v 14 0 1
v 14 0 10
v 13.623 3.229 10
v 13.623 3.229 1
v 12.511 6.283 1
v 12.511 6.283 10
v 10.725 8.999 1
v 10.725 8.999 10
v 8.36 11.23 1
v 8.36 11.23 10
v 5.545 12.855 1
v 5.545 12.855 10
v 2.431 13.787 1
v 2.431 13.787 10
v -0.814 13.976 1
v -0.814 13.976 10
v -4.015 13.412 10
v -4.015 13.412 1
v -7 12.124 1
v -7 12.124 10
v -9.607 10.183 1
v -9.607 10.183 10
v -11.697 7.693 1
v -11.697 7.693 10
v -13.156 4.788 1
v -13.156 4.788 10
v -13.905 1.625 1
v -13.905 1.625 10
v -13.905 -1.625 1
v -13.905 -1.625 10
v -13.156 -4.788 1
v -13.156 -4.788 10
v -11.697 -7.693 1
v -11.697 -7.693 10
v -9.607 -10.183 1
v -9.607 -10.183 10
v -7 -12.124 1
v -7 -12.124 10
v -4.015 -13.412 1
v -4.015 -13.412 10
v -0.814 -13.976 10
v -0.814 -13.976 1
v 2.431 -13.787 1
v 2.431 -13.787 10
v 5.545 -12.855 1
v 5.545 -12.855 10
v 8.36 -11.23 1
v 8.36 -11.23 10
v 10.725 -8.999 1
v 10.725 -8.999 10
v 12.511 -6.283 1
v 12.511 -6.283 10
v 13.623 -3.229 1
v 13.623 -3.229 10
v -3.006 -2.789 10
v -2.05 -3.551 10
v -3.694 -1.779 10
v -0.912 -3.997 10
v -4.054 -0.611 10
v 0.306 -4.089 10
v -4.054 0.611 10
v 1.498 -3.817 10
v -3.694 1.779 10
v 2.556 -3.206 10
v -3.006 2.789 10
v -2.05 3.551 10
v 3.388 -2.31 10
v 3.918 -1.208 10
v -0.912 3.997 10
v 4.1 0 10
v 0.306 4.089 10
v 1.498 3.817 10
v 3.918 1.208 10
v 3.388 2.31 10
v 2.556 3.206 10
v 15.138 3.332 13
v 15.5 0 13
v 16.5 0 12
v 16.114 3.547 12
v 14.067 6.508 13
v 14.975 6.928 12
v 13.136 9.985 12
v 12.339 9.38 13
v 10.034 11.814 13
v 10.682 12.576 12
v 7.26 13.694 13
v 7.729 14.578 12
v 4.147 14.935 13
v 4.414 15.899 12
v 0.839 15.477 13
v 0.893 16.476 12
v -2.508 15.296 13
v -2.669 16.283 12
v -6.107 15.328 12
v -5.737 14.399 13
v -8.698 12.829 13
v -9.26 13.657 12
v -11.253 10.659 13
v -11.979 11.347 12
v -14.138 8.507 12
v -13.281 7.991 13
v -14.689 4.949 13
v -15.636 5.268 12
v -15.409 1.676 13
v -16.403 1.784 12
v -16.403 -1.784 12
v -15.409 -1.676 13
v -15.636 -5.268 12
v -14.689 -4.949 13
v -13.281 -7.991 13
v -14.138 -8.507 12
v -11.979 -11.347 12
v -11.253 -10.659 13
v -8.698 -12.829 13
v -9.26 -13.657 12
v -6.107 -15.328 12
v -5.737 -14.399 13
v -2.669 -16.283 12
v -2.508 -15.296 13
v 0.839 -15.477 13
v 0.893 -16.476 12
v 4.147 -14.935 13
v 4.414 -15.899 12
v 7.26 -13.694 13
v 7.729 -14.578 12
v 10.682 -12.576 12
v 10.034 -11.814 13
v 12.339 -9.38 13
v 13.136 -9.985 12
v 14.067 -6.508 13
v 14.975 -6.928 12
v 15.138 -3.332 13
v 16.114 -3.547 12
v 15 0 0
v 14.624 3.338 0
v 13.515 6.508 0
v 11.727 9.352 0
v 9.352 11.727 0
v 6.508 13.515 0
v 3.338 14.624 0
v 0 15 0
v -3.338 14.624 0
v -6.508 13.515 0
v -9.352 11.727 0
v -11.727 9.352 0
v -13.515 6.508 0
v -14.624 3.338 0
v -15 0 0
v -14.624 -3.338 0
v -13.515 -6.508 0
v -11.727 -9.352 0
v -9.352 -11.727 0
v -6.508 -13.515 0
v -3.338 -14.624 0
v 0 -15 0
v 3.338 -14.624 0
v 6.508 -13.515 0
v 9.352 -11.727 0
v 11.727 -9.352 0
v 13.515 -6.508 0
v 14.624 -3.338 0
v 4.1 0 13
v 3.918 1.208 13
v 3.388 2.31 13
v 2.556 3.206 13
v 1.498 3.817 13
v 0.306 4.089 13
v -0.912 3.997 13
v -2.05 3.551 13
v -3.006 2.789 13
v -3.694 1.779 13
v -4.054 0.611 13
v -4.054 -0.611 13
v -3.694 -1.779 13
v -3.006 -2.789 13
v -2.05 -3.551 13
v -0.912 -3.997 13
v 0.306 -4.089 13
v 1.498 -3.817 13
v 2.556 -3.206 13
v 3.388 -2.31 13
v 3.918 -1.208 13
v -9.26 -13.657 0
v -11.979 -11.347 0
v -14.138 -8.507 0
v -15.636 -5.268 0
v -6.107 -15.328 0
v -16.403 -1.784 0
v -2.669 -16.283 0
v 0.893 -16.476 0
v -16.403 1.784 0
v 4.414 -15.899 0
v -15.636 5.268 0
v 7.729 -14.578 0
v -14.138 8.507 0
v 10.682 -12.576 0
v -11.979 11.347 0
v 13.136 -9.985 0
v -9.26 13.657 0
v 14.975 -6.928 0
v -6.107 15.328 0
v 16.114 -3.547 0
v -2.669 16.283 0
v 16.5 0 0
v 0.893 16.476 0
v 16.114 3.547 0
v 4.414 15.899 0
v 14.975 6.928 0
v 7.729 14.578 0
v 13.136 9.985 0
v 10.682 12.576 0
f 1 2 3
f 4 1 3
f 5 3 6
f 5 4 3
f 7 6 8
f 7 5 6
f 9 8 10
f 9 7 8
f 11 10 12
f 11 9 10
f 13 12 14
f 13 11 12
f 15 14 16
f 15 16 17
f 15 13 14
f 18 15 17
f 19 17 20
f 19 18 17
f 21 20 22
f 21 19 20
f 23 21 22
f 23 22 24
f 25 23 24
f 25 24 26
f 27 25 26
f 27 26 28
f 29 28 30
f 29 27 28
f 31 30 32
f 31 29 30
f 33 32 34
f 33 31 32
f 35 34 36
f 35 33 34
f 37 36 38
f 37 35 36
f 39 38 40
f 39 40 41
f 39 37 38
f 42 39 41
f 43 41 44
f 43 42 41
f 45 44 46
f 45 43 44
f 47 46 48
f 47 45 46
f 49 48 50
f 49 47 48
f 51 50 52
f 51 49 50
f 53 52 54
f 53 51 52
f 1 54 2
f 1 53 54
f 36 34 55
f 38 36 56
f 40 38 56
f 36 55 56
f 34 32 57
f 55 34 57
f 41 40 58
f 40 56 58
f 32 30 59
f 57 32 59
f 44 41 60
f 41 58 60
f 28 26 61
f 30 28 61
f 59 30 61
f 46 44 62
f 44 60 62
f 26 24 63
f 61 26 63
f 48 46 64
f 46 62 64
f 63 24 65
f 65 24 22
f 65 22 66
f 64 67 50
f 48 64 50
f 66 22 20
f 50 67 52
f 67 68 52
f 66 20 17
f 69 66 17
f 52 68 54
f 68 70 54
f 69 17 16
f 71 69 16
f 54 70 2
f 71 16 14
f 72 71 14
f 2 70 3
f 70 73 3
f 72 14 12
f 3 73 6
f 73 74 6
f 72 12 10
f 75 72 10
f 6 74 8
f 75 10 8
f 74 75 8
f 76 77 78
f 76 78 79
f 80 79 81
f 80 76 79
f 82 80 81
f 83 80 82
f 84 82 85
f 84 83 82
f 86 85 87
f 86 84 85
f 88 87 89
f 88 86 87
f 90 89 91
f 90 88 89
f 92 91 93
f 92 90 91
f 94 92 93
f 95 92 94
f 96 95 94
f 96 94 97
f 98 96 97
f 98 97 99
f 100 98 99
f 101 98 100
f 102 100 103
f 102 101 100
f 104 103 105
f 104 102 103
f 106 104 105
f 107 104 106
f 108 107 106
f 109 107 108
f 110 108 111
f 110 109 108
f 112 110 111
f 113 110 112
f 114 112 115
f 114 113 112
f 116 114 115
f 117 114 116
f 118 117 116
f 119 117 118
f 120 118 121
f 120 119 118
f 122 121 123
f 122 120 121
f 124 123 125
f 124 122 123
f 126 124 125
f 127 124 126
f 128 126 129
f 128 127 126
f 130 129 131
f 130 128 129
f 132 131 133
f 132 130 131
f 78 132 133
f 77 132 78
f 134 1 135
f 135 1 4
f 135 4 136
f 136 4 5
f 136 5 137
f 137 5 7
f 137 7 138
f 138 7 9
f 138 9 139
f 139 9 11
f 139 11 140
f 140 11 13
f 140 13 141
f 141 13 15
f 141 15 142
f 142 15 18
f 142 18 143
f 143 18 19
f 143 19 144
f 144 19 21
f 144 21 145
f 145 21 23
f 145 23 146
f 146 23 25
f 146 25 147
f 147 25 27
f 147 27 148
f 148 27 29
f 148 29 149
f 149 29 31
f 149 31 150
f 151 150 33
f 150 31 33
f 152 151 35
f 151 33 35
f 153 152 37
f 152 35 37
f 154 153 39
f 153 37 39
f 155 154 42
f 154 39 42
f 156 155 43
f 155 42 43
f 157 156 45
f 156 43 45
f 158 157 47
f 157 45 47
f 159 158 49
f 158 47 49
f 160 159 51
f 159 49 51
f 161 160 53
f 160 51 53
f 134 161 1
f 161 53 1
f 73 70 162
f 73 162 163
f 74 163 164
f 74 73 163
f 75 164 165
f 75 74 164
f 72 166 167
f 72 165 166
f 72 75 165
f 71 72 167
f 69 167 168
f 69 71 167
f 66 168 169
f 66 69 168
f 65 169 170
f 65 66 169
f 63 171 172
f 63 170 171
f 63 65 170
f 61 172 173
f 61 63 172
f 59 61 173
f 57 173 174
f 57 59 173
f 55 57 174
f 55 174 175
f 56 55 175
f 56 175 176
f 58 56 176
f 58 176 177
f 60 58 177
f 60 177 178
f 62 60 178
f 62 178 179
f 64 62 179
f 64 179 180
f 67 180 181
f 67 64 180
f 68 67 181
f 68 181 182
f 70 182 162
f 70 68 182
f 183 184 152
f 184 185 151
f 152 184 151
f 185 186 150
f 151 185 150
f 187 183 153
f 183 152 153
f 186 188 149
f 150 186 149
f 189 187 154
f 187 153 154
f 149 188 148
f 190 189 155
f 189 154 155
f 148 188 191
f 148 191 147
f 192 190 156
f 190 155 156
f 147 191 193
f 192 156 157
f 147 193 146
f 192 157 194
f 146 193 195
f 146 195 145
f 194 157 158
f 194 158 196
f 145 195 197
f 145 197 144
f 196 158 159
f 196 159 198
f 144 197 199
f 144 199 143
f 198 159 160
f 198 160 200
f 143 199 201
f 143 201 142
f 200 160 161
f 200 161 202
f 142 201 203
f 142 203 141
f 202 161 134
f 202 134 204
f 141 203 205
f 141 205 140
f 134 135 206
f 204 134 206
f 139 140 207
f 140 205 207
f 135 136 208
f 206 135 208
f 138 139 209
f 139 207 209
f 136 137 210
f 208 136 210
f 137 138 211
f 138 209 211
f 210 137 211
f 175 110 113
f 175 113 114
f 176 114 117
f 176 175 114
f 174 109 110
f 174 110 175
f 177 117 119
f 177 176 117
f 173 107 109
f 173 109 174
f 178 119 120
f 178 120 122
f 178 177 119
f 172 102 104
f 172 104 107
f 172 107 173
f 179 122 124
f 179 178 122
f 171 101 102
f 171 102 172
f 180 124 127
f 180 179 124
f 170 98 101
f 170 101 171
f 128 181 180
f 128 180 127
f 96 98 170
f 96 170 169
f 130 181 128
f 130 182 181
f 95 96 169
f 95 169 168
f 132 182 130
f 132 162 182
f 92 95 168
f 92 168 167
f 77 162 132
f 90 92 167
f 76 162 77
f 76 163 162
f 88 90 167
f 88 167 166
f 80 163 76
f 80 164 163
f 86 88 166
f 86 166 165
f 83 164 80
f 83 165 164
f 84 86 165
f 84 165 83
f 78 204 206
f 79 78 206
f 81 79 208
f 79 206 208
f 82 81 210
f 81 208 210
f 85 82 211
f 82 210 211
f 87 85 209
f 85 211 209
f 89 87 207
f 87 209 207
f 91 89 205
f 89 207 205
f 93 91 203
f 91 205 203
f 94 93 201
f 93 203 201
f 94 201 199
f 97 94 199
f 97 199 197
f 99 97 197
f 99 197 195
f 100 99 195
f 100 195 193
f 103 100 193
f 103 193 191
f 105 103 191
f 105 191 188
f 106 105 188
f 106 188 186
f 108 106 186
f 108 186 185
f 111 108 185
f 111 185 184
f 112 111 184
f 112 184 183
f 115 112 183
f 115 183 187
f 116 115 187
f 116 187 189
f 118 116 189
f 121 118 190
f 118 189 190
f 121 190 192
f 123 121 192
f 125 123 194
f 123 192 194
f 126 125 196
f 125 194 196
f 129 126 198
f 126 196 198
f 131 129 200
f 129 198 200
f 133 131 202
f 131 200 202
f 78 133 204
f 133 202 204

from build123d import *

# Parameters (mm, degrees)
ESQUISSE1_R                  = 16.5
ESQUISSE1_R_2                = 14
BOSS_EXTRU_1_DEPTH           = 10
ESQUISSE2_R                  = 16.5
BOSS_EXTRU_2_DEPTH           = 3
CHANFREIN1_SIZE              = 1
ENL_V_MAT_EXTRU_1_DEPTH      = 27.711420778
ENL_V_MAT_EXTRU_1_DEPTH_BACK = 27.711420778
ESQUISSE3_R                  = 4.1
CHANFREIN2_SIZE              = 1


with BuildPart() as part:
    # Esquisse1 → Boss.-Extru.1 (new body)
    with BuildSketch(Plane.XY):
        Circle(ESQUISSE1_R)
        Circle(ESQUISSE1_R_2, mode=Mode.SUBTRACT)
    extrude(amount=BOSS_EXTRU_1_DEPTH)

    # Esquisse2 → Boss.-Extru.2 (add)
    with BuildSketch(Plane.XY.offset(10)):
        Circle(ESQUISSE2_R)
    extrude(amount=BOSS_EXTRU_2_DEPTH)

    # Chanfrein1
    chanfrein1_edges = [part.edges().sort_by_distance(p)[0] for p in [
        (-14, 0, 0),
    ]]
    chamfer(chanfrein1_edges, length=CHANFREIN1_SIZE)

    # Esquisse3 → Enlèv. mat.-Extru.1 (cut, two sides: drawn at the far end of the back side and taken through both)
    with BuildSketch(Plane.XY.offset(13).offset(-ENL_V_MAT_EXTRU_1_DEPTH_BACK)):
        Circle(ESQUISSE3_R)
    extrude(amount=ENL_V_MAT_EXTRU_1_DEPTH + ENL_V_MAT_EXTRU_1_DEPTH_BACK, mode=Mode.SUBTRACT)

    # Chanfrein2
    chanfrein2_edges = [part.edges().sort_by_distance(p)[0] for p in [
        (-16.5, 0, 13),
    ]]
    chamfer(chanfrein2_edges, length=CHANFREIN2_SIZE)


solid = part.part
